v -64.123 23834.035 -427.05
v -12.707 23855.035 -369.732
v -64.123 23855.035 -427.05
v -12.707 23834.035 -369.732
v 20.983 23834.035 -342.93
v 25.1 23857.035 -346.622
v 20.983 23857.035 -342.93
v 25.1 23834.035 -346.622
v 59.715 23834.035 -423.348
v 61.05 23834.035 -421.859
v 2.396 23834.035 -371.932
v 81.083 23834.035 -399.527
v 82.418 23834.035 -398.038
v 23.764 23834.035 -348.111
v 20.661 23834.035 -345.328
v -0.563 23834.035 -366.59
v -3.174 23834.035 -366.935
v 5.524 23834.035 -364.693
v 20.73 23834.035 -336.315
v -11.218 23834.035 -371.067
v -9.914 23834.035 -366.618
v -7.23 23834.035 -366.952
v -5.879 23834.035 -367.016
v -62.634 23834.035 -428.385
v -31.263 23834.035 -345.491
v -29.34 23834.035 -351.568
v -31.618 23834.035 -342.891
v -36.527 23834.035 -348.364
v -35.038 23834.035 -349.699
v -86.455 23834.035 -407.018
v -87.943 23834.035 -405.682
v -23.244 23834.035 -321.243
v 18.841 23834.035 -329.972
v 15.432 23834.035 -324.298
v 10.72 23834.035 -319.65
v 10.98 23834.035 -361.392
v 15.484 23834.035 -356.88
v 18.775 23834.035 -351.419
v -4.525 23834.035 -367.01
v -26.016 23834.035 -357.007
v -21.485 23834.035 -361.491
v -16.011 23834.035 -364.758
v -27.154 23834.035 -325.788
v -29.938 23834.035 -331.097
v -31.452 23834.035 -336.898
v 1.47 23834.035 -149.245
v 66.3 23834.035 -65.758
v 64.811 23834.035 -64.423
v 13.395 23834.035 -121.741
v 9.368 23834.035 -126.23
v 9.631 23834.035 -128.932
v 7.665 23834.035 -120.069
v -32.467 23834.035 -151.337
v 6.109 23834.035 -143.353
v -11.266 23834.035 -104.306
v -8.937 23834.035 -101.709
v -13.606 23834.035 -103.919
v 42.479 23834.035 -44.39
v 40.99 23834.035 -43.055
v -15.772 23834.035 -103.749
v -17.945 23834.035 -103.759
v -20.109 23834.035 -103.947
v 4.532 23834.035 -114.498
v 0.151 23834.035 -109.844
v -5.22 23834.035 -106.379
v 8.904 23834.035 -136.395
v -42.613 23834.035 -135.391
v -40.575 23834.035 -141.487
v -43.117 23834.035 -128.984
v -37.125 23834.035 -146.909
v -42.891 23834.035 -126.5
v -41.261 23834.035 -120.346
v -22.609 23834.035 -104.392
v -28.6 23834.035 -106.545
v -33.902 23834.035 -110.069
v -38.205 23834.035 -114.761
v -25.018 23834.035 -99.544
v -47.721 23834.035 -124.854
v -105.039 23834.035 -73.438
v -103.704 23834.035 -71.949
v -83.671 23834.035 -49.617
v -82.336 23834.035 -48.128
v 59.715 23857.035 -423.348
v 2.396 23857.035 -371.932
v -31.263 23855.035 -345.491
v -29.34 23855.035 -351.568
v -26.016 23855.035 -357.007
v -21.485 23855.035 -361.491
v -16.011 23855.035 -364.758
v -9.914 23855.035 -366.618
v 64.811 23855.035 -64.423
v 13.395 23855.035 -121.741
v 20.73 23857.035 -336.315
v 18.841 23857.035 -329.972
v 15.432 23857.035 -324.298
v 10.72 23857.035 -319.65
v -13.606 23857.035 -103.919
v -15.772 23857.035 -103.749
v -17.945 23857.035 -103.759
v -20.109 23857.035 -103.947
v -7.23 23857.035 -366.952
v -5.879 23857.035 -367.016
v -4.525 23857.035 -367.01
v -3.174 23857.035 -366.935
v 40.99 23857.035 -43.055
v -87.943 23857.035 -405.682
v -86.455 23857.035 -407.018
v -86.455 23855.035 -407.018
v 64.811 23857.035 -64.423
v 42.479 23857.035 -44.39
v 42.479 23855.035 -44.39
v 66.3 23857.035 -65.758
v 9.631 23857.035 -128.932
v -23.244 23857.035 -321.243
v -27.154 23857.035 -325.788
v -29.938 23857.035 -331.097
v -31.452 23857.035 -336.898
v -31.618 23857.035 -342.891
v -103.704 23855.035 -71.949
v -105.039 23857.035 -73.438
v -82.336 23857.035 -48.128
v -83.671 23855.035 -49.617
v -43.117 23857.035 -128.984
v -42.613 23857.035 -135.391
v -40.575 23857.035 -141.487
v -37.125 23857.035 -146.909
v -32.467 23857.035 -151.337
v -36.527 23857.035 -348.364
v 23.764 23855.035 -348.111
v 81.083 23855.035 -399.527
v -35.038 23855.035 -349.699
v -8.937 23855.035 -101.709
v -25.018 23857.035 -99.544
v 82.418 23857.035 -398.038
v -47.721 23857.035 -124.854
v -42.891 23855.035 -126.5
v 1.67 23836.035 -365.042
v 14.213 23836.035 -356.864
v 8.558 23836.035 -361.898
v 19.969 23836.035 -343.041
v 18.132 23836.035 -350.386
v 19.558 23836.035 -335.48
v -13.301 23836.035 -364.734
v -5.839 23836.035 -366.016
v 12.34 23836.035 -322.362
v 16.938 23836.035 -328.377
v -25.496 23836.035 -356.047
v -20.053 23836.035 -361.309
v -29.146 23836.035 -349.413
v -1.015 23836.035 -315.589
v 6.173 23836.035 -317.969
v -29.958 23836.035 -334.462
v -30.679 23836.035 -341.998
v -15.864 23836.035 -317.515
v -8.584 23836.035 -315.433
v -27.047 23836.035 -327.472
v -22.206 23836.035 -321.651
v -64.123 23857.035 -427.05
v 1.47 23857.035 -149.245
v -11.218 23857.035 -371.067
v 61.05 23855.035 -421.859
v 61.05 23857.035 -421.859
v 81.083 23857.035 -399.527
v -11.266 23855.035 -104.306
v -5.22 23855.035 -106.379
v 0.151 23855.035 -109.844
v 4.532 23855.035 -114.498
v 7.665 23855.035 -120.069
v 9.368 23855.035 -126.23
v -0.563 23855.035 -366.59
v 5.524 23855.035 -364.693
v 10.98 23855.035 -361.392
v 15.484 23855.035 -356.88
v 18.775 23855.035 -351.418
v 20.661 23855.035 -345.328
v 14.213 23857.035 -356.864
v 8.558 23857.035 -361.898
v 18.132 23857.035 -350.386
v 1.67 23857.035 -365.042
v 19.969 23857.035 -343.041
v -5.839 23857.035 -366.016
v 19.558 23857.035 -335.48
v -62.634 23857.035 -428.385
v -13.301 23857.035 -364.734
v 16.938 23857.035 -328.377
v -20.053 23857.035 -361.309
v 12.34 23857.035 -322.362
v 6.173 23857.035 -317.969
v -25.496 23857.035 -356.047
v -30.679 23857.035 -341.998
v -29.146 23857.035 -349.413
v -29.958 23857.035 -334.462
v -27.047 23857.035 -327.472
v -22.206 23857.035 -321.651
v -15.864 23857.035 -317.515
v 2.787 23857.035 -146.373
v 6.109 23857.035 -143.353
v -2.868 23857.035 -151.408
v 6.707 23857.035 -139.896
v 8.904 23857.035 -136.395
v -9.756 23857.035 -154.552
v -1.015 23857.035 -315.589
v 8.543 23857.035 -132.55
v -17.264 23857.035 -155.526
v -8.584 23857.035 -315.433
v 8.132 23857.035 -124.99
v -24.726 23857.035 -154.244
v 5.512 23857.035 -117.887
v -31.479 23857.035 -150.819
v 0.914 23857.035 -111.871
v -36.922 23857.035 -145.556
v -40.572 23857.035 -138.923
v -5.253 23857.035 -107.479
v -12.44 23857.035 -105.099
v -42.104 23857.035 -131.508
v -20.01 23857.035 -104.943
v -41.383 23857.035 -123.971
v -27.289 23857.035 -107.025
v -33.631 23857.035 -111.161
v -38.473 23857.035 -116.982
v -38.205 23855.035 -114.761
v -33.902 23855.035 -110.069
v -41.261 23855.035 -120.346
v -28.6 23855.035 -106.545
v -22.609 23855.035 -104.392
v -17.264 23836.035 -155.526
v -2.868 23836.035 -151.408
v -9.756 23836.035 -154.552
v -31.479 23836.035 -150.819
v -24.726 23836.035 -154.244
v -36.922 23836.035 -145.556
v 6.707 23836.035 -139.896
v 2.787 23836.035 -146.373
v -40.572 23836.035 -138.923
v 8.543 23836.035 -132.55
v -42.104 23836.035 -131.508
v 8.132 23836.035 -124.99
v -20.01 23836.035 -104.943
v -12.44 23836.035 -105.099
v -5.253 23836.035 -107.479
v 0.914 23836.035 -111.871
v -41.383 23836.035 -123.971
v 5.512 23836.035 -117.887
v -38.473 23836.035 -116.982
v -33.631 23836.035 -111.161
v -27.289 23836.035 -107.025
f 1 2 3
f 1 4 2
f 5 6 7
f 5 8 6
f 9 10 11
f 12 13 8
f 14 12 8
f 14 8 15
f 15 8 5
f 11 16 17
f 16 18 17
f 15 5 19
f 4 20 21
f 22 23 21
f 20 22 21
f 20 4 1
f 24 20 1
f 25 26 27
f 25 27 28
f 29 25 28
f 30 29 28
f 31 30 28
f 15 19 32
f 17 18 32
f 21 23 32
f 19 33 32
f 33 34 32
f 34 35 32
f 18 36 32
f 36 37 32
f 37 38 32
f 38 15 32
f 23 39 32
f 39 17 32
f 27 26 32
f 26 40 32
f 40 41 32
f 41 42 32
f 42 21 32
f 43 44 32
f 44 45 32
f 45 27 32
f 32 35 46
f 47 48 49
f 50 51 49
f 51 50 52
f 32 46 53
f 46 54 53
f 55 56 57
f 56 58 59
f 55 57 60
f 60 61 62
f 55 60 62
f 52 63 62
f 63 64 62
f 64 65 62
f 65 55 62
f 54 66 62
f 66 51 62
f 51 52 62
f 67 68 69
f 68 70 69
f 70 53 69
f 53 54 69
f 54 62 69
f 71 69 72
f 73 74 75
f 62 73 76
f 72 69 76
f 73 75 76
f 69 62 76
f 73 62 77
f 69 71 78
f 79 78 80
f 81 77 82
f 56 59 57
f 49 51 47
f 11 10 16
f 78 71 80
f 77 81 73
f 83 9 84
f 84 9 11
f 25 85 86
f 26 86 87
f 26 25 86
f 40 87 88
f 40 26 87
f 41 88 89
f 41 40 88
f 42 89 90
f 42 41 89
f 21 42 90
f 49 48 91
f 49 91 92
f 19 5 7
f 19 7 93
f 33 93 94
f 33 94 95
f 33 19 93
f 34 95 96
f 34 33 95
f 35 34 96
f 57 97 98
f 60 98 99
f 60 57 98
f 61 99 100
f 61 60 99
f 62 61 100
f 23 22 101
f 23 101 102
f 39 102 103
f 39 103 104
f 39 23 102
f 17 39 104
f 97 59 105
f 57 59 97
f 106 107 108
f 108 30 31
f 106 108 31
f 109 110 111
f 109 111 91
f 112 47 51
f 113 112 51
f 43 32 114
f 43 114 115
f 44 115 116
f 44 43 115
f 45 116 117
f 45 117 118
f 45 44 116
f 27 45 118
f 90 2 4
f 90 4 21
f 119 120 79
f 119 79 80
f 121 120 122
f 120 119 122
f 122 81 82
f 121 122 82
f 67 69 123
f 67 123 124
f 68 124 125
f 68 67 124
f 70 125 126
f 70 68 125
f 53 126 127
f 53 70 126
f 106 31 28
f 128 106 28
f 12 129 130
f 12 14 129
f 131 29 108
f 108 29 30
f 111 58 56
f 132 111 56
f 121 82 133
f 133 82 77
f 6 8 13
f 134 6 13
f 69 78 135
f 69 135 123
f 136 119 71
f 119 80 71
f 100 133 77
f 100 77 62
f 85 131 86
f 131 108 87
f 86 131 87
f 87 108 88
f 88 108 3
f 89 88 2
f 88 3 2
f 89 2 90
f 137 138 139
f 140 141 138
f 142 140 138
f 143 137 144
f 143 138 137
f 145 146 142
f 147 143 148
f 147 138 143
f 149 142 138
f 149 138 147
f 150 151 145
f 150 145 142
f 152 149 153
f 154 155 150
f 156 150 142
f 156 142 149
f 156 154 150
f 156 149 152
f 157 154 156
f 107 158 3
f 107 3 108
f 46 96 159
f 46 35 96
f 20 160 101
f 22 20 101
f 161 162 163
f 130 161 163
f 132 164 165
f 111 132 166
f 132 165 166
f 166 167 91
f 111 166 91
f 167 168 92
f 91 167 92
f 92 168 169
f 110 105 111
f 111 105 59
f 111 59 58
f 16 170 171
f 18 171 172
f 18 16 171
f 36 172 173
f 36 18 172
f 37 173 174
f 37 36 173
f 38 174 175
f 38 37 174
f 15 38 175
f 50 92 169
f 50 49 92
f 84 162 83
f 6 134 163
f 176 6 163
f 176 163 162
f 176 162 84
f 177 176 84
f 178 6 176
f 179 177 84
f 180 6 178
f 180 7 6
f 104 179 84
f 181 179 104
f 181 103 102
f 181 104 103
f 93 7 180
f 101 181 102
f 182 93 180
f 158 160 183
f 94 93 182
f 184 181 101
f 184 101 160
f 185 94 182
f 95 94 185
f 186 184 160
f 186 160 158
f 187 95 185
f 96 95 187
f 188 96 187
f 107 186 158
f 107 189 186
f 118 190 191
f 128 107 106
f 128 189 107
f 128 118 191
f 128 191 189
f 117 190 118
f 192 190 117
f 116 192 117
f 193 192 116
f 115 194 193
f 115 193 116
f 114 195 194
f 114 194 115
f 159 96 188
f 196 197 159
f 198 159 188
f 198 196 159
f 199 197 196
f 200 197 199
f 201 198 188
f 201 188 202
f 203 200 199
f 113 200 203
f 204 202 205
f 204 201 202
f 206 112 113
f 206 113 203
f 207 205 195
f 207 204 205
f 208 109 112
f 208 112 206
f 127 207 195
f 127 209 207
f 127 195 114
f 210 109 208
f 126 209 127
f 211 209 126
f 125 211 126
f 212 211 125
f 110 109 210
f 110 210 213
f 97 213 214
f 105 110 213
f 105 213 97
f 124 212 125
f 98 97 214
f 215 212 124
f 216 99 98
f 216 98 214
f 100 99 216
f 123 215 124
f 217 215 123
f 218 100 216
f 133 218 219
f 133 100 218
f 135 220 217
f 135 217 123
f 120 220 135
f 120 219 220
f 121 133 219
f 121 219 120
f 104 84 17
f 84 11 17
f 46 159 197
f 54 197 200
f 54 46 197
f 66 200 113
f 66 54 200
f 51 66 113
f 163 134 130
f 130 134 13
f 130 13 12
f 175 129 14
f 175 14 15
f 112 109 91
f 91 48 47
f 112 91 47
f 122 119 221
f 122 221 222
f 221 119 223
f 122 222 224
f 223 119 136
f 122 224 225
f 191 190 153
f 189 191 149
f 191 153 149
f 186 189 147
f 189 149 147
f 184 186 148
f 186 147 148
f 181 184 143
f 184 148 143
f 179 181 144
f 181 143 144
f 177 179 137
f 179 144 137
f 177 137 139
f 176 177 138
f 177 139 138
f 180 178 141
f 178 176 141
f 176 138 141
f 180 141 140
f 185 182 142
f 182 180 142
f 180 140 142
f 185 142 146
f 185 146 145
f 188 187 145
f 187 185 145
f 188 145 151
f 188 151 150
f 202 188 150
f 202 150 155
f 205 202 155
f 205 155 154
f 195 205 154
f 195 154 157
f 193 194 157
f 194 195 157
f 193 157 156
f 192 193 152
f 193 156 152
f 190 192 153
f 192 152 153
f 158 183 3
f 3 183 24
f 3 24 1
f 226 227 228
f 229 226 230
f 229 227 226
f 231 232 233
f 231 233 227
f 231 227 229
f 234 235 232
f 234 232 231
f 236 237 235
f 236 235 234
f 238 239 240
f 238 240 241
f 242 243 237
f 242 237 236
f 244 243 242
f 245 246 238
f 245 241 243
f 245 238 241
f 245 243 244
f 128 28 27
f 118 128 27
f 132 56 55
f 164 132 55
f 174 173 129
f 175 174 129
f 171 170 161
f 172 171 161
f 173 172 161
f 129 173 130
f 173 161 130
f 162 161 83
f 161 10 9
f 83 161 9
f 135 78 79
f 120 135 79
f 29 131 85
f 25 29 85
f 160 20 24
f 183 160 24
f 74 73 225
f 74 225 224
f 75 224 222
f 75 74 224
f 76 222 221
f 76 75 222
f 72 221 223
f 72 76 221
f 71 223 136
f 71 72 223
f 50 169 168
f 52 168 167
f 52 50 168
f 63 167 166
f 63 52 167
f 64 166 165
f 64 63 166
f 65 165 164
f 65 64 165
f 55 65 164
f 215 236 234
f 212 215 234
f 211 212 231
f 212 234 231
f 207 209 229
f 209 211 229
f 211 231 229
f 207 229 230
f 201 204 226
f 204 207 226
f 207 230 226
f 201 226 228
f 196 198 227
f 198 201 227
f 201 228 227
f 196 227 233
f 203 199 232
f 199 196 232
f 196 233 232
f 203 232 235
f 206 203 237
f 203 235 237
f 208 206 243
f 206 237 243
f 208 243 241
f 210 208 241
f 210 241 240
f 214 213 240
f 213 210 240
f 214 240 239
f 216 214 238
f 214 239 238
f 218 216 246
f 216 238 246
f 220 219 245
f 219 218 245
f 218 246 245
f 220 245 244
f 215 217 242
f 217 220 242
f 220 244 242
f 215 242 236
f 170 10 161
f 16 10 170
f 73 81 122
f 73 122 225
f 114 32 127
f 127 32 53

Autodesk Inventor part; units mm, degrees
ref_plane "YZ Plane" through (0, 0, 0) normal (1, 0, 0) x (0, 1, 0)
ref_plane "XZ Plane" through (0, 0, 0) normal (0, 1, 0) x (-1, 0, 0)
ref_plane "XY Plane" through (0, 0, 0) normal (0, 0, 1) x (1, 0, 0)
ref_plane "Work Plane1" through (-8.7385, 23834.0351, -280.5199) normal (0, 1, 0) x (-0.9985, 0, -0.0542)
sketch "Sketch1" plane through (-8.7385, 23834.0351, -280.5199) normal (0, 1, 0) x (-0.9985, 0, -0.0542)
  circle A0 centre (-0.1598, -60.199) radius 25.4
  circle A1 centre (-0.1598, 150.601) radius 25.4
  circle A2 centre (-0.1598, 150.601) radius 26.4
  circle A3 centre (-0.1598, -60.199) radius 26.4
  line L0 (-17.3085, -5.3414) -> (16.6915, -5.3414)
  line L1 (16.6915, -5.3414) -> (16.6915, 52.8634)
  line L2 (16.6915, 52.8634) -> (-17.3085, 52.8634)
  line L3 (-17.3085, 52.8634) -> (-17.3085, -5.3414)
  line L4 (-17.3085, 52.8634) -> (-17.3085, 130.529)
  line L5 (-17.3085, -5.3414) -> (-17.3085, -40.1271)
  line L6 (16.6915, -5.3414) -> (16.6915, -39.8768)
  line L7 (16.6915, 52.8634) -> (16.6915, 130.2787)
  line L8 (31.4252, -66.238) -> (7.3835, -90.2796)
  line L9 (7.3835, -90.2796) -> (61.8308, -144.7269)
  line L10 (61.8308, -144.7269) -> (85.8724, -120.6852)
  line L11 (85.8724, -120.6852) -> (31.4252, -66.238)
  line L12 (30.0109, -67.6522) -> (84.4582, -122.0994)
  line L13 (8.7977, -88.8654) -> (63.245, -143.3126)
  line L14 (-6.1639, -91.881) -> (-30.2055, -67.8394)
  line L15 (-30.2055, -67.8394) -> (-84.6528, -122.2866)
  line L16 (-84.6528, -122.2866) -> (-60.6111, -146.3283)
  line L17 (-60.6111, -146.3283) -> (-6.1639, -91.881)
  line L18 (-7.5781, -90.4668) -> (-62.0253, -144.914)
  line L19 (-28.7913, -69.2536) -> (-83.2386, -123.7008)
  line L20 (84.9349, 211.9974) -> (60.8933, 236.039)
  line L21 (60.8933, 236.039) -> (6.446, 181.5918)
  line L22 (6.446, 181.5918) -> (30.4877, 157.5502)
  line L23 (30.4877, 157.5502) -> (84.9349, 211.9974)
  line L24 (83.5207, 213.4116) -> (29.0735, 158.9644)
  line L25 (62.3075, 234.6248) -> (7.8603, 180.1776)
  line L26 (-32.1213, 155.9317) -> (-8.0796, 179.9733)
  line L27 (-86.5685, 210.3789) -> (-32.1213, 155.9317)
  line L28 (-85.1543, 211.7931) -> (-30.707, 157.3459)
  line L29 (-62.5268, 234.4205) -> (-86.5685, 210.3789)
  line L30 (-63.9411, 233.0063) -> (-9.4938, 178.5591)
  line L31 (-8.0796, 179.9733) -> (-62.5268, 234.4205)
  line L32 (-7.5781, -90.4668) -> (-3.4984, -86.3871)
  line L33 (-6.1639, -91.881) -> (-0.8723, -86.5894)
  line L34 (-30.2055, -67.8394) -> (-26.295, -63.9289)
  line L35 (-28.7913, -69.2536) -> (-25.8437, -66.306)
  line L36 (31.4252, -66.238) -> (26.2268, -61.0397)
  line L37 (30.0109, -67.6522) -> (26.0131, -63.6544)
  line L38 (8.7977, -88.8654) -> (5.8404, -85.9081)
  line L39 (7.3835, -90.2796) -> (3.1788, -86.3871)
  line L40 (29.0735, 158.9644) -> (25.7539, 155.6448)
  line L41 (30.4877, 157.5502) -> (26.1142, 153.1768)
  line L42 (7.8603, 180.1776) -> (4.3036, 176.6209)
  line L43 (6.446, 181.5918) -> (1.7836, 176.9293)
  line L44 (-8.0796, 179.9733) -> (-4.7119, 176.6056)
  line L45 (-9.4938, 178.5591) -> (-7.0269, 176.0922)
  line L46 (-30.707, 157.3459) -> (-26.443, 153.0818)
  line L47 (-32.1213, 155.9317) -> (-26.5588, 150.3692)
  point P0 (-23.9414, 279.6329)
  point P1 (-30.2055, -67.8394)
  dimension "d3" = 52.8
  dimension "d4" = 52.8
  dimension "d0" = 50.8
  dimension "d1" = 50.8
  dimension "d2" = 210.8
  dimension "d9" = 34
  dimension "d18" = 34
  dimension "d19" = 77
  dimension "d20" = 2
  dimension "d21" = 2
  dimension "d22" = 34
  dimension "d23" = 77
  dimension "d24" = 2
  dimension "d25" = 2
  dimension "d26" = 34
  dimension "d27" = 77
  dimension "d28" = 2
  dimension "d29" = 2
  dimension "d30" = 34
  dimension "d31" = 77
  dimension "d32" = 2
  dimension "d33" = 2
extrude "Extrusion1" add sketch "Sketch1" along normal blind 2 contours A0 | A1
extrude "Extrusion2" add sketch "Sketch1" along normal blind 23 contours A2 L26 | A3 | A2 L26
extrude "Extrusion3" add sketch "Sketch1" along normal blind 23 contours L7 L2 L4 A2 | L1 L0 L3 L2 | L6 A3 L5 L0
extrude "Extrusion4" add sketch "Sketch1" along normal blind 23 contours A2 L40 L22 L41 | L22 L24 L20 L23 | A2 L43 L22 L42 | L47 L26 L46 A2 | L22 L21 L20 L25 | L27 L29 L28 L26 | A2 L45 L26 L44 | L26 L30 L29 L31 | A3 L35 L14 L34 | L36 L8 L37 A3 | L14 L19 L16 L15 | L11 L10 L12 L8 | A3 L33 L14 L32 | L38 L8 L39 A3 | L14 L17 L16 L18 | L13 L10 L9 L8
sketch "Sketch2" plane through (-8.7385, 23857.0351, -280.5199) normal (0, 1, 0) x (0.9985, 0, 0.0542)
  line L0 (-83.5207, -213.4116) -> (-25.7539, -155.6448) projected
  arc A0 (-25.7539, -155.6448) -> (-4.3036, -176.6209) centre (0.1598, -150.601) ccw projected
  line L1 (-4.3036, -176.6209) -> (-62.3075, -234.6248) projected
  line L2 (63.9411, -233.0063) -> (7.0269, -176.0922) projected
  arc A1 (7.0269, -176.0922) -> (26.443, -153.0818) centre (0.1598, -150.601) ccw projected
  line L3 (26.443, -153.0818) -> (85.1543, -211.7931) projected
  line L4 (-26.0131, 63.6544) -> (-84.4582, 122.0994) projected
  arc A2 (-5.8404, 85.9081) -> (-26.0131, 63.6544) centre (0.1598, 60.199) ccw projected
  line L5 (-63.245, 143.3126) -> (-5.8404, 85.9081) projected
  line L6 (3.4984, 86.3871) -> (62.0253, 144.914) projected
  arc A3 (25.8437, 66.306) -> (3.4984, 86.3871) centre (0.1598, 60.199) ccw projected
  line L7 (83.2386, 123.7008) -> (25.8437, 66.306) projected
  line L8 (62.0253, 144.914) -> (83.2386, 123.7008)
  line L9 (-84.4582, 122.0994) -> (-85.8724, 120.6852) projected
  line L10 (-63.245, 143.3126) -> (-84.4582, 122.0994)
  line L11 (-4.3036, -176.6209) -> (-62.3075, -234.6248) projected
  line L12 (-62.3075, -234.6248) -> (-83.5207, -213.4116)
  line L13 (-83.5207, -213.4116) -> (-25.7539, -155.6448) projected
  line L14 (63.9411, -233.0063) -> (85.1543, -211.7931)
  point P0 (23.9414, -279.6329)
  point P1 (62.0253, 144.914)
  point P2 (-83.5207, -213.4116)
extrude "Extrusion5" add sketch "Sketch2" against normal blind 2
properties part number "Base"
